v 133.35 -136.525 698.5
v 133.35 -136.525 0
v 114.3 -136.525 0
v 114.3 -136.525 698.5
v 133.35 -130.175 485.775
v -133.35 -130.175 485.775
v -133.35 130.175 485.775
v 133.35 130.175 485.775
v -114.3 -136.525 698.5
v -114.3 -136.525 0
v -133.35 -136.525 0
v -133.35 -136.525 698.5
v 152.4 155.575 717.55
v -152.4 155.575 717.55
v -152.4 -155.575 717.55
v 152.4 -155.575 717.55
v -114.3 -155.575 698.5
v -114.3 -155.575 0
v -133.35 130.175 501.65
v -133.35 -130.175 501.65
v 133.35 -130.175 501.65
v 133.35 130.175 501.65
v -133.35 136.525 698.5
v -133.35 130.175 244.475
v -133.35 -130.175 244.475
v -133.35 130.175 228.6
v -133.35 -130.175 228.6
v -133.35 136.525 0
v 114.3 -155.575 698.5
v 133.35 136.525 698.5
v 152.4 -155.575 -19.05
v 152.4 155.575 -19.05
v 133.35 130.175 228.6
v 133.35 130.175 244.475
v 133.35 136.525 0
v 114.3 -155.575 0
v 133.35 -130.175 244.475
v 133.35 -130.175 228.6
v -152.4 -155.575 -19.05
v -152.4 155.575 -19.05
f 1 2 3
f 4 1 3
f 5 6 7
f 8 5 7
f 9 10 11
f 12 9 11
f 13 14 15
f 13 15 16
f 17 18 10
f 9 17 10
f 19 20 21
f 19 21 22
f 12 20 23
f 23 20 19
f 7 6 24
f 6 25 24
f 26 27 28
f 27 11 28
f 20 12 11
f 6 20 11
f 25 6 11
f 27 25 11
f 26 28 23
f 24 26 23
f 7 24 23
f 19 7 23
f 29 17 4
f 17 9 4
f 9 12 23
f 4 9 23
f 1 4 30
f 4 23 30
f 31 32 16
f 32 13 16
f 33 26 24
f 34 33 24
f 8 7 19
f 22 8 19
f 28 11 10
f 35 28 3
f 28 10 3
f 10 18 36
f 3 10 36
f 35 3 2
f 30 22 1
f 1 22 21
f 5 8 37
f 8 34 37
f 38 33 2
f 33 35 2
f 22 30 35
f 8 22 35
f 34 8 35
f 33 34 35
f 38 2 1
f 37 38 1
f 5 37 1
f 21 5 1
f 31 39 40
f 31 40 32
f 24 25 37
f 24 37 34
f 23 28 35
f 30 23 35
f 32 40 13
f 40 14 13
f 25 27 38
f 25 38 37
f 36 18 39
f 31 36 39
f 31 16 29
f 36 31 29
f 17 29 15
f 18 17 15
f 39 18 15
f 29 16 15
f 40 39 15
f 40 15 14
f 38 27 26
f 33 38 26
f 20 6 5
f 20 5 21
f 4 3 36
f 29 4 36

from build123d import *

# Parameters (mm, degrees)
F1_DEPTH = 698.5
F3_DEPTH = 19.05
F5_DEPTH = 19.05
F6_W     = 260.35
F6_H     = 15.875
F7_DEPTH = 266.7


with BuildPart() as f1:
    # F0 (on Top) → F1 (new body)
    with BuildSketch(Plane.XY):
        Polygon((-133.35, -136.525), (-133.35, 136.525), (133.35, 136.525), (133.35, -136.525), (114.3, -136.525), (114.3, -155.575), (152.4, -155.575), (152.4, 155.575), (-152.4, 155.575), (-152.4, -155.575), (-114.3, -155.575), (-114.3, -136.525), align=None)
    extrude(amount=F1_DEPTH)

    # F2 (on face) → F3 (join)
    with BuildSketch(Plane.XY.offset(698.5)):
        Polygon((152.4, 155.575), (-152.4, 155.575), (-152.4, -155.575), (-114.3, -155.575), (-114.3, -136.525), (-133.35, -136.525), (-133.35, 136.525), (133.35, 136.525), (133.35, -136.525), (114.3, -136.525), (114.3, -155.575), (152.4, -155.575), align=None)
        Polygon((-114.3, -136.525), (-114.3, -155.575), (114.3, -155.575), (114.3, -136.525), (133.35, -136.525), (133.35, 136.525), (-133.35, 136.525), (-133.35, -136.525), align=None)
    extrude(amount=F3_DEPTH)

    # F4 (on face) → F5 (join)
    with BuildSketch(Plane(origin=(0, 0, 0), x_dir=(1, 0, 0), z_dir=(0, 0, -1))):
        Polygon((114.3, 155.575), (-114.3, 155.575), (-114.3, 136.525), (-133.35, 136.525), (-133.35, -136.525), (133.35, -136.525), (133.35, 136.525), (114.3, 136.525), align=None)
        Polygon((-152.4, 155.575), (-152.4, -155.575), (152.4, -155.575), (152.4, 155.575), (114.3, 155.575), (114.3, 136.525), (133.35, 136.525), (133.35, -136.525), (-133.35, -136.525), (-133.35, 136.525), (-114.3, 136.525), (-114.3, 155.575), align=None)
    extrude(amount=F5_DEPTH)

    # F6 (on face) → F7 (join, through all)
    with BuildSketch(Plane.YZ.offset(-133.35)):
        with Locations((0, 493.7125)):
            Rectangle(F6_W, F6_H)
        with Locations((0, 236.5375)):
            Rectangle(F6_W, F6_H)
    extrude(amount=F7_DEPTH)


solid = f1.part
